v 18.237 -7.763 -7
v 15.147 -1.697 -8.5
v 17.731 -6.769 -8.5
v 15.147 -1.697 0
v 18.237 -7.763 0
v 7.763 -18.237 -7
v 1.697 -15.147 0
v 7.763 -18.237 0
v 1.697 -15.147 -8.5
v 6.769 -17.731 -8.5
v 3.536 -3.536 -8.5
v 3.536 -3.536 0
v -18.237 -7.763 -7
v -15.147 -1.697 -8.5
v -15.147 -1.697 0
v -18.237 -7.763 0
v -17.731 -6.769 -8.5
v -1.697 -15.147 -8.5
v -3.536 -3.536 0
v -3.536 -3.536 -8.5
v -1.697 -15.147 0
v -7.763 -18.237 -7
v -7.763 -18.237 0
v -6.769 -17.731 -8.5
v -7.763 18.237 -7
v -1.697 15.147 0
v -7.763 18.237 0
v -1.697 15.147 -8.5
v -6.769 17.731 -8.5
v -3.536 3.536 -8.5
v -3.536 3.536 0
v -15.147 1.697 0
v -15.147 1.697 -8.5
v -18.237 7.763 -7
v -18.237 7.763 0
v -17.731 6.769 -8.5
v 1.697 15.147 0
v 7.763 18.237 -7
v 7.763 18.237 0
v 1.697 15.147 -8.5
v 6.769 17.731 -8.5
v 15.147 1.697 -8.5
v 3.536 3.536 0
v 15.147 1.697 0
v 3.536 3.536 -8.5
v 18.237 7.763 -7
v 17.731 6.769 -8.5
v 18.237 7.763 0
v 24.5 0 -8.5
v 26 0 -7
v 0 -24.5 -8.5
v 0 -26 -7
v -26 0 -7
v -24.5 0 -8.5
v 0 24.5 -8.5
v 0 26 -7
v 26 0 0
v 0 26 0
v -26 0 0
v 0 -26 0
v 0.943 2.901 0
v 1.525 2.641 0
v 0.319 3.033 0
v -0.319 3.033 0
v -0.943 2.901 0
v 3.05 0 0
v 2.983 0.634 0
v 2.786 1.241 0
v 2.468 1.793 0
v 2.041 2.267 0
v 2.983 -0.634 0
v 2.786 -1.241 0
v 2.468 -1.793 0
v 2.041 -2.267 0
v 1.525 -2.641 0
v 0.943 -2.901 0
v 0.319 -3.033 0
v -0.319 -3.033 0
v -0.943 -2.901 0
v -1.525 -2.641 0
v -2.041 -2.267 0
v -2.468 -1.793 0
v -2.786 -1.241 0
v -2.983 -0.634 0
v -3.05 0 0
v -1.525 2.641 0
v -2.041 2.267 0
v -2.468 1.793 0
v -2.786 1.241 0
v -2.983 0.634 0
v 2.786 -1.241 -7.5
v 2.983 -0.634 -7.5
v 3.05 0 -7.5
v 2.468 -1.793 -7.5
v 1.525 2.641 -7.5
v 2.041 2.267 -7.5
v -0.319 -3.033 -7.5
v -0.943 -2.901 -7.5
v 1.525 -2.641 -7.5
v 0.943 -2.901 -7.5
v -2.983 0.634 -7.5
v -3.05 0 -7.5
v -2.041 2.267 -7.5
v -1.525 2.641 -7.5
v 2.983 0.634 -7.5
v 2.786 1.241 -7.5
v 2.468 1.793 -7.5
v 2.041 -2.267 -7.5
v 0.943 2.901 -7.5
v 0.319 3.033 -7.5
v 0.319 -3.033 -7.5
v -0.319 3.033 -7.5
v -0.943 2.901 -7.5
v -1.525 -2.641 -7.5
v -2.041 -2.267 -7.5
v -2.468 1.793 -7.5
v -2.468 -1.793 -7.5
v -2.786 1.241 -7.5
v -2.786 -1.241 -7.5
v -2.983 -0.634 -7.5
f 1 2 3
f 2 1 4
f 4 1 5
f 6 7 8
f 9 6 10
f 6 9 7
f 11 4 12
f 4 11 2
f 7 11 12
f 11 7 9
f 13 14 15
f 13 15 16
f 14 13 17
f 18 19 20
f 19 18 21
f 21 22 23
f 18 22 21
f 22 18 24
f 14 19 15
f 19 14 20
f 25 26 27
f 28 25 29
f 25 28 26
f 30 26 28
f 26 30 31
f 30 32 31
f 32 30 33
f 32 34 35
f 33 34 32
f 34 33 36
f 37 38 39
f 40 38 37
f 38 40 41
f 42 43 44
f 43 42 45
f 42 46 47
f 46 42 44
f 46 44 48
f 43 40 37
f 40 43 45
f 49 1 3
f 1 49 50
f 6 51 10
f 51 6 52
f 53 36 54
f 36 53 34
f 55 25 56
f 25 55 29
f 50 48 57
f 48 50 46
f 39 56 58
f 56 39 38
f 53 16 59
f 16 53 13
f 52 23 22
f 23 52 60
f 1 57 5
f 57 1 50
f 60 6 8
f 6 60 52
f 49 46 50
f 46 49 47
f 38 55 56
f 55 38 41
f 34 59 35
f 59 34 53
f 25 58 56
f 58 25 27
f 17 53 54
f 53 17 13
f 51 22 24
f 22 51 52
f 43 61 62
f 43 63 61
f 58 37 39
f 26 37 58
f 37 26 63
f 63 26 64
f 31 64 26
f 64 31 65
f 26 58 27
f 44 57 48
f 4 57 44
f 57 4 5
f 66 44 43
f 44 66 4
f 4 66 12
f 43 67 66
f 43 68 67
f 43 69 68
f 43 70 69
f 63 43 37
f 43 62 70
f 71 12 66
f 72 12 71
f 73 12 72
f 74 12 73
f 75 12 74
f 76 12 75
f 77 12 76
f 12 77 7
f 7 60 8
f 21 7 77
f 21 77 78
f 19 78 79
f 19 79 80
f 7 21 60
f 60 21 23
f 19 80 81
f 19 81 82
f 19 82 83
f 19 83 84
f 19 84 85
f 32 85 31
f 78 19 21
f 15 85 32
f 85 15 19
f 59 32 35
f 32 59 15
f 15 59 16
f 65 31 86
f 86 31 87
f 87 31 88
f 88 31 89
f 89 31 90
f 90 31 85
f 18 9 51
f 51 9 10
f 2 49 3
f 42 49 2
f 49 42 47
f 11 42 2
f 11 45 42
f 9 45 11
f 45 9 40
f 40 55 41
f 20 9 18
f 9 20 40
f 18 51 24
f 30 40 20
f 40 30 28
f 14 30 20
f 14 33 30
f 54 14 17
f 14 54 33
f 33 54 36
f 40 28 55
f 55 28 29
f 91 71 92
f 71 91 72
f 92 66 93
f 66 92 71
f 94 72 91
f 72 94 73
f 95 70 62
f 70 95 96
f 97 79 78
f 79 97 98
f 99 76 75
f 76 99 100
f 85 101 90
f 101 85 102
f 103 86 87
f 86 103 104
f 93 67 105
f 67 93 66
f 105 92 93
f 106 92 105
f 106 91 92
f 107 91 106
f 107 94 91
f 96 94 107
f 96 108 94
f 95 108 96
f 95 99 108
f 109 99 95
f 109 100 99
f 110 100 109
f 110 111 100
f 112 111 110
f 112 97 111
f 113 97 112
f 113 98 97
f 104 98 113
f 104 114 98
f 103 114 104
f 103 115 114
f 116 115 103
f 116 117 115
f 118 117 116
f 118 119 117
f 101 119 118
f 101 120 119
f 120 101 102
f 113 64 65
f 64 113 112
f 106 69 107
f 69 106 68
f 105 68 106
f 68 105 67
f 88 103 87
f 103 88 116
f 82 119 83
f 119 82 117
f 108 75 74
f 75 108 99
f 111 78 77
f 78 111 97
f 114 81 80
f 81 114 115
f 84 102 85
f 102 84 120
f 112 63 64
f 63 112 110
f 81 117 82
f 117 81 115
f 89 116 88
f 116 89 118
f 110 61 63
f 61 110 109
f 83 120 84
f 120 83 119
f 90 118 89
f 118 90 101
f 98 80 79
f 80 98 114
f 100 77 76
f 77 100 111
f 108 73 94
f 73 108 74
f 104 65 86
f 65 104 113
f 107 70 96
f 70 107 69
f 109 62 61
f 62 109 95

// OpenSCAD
/* Knob
Jack Ha 2016
*/

// C = Cylinder, F = Flower
SHAPE = "C";  

// ** Cylinder options OUTER RADIUS
CYLINDER_R_OUTER = 26;
// 'amount of taper'
ROUNDING_R = 1.5;
C_FN = 4;

C_CUT_NUM = 4;  // often the same as C_FN
C_CUT_R = 10; //radius
C_CUT_OFFSET = 15;  
C_CUT_FN = 5; // vertices
C_CUT_SCALE = 1;  // normally 1, scale the cylinder being cut from base, try it out :-)
C_CUT_ANGLE = 36;
// precalculation, do not change
C_ANGLE = 360 / C_CUT_NUM;
C_ANGLE_OFFSET = 0.5 * C_ANGLE;  // 0 or 0.5*C_ANGLE 

// ** Flower options
F_NUM_LEAFS = 3;  // 5, 7, 3
F_LEAF_OFFSET = 22.5;  // 20, 20, 20
F_LEAF_R_INNER = 5;  // 2.5, 2, 5
F_LEAF_R_OUTER = 1.5;  // 6, 5, 2
// precalculation, do not change
F_ANGLE = 360 / F_NUM_LEAFS;


// AXLE options

// HEIGHT=13 for 20mm pots/rotary encoders, 10 for 15mm; or through hole, then choose something you like^^
H = 8.5;

// D for D shape or N for normal
AXLE_TYPE = "N";  

// depth of hole, optionally leave 1 mm on top (H-1) or through hole (H+1)
AXLE_D = H - 1;  
// for D axle hole, there is an extra round part
AXLE_D2 = 2.5;  
// for 6mm axle
AXLE_R = 3.05;

// for 6mm D shaped axle
AXLE_D_R = 3.2;

module pin_d(r, d) {
	translate([0,0,-0.1])
	difference() {
		cylinder(r=r, h=0.1+d, $fn=30);
		translate([1.6,-50,-1])
		cube([100,100,100]);
	}
}

module pin(r, d) {
	translate([0,0,-0.1])
    cylinder(r=r, h=0.1+d, $fn=30);
}


M = [ [ 1, 0, 0, 0 ],
       [ 0, 1, 0.3, 0 ],  // The "0.7" is the skew value; pushed along the y axis
       [ 0, 0, 1, 0 ],
       [ 0, 0, 0, 1 ] ] ;

module base_cylinder() {
    difference() {
	minkowski() {
        //multmatrix(M) {
        //    union() {
		//sphere(r=ROUNDING_R, $fn=12);
		cylinder(r1=ROUNDING_R, r2=0, h=ROUNDING_R, $fn=C_FN);
		cylinder(r=CYLINDER_R_OUTER-ROUNDING_R, h=H-ROUNDING_R, $fn=C_FN);
        //    }
        //}
	}
    for (i=[0:C_CUT_NUM-1]) {
            rotate([0,0,C_ANGLE_OFFSET+C_ANGLE*i])
            translate([C_CUT_OFFSET,0,-0.1])
            rotate([0,0,C_CUT_ANGLE])            
            scale([C_CUT_SCALE,1,1])
        
            //multmatrix(M) {
            //union() {
                cylinder(r=C_CUT_R, h=H+0.2, $fn=C_CUT_FN); }
            //}
        //}
    }
}

module flower() {
    for (i=[0:F_NUM_LEAFS-1]) {
        rotate([0,0,F_ANGLE*i])
        hull() {
            cylinder(r=F_LEAF_R_INNER, h=H);

            translate([F_LEAF_OFFSET,0,0])
            cylinder(r=F_LEAF_R_OUTER, h=H);
        }
    }
}


rotate([180,0,0])
difference() {
    if (SHAPE == "C") {
        base_cylinder();
    } else if (SHAPE == "F") {
        flower();
    }
    if (AXLE_TYPE == "D") {
        pin_d(AXLE_D_R, AXLE_D);
        pin(AXLE_D_R+0.2, AXLE_D2);
    } else {
        pin(AXLE_R, AXLE_D);
    }
}
